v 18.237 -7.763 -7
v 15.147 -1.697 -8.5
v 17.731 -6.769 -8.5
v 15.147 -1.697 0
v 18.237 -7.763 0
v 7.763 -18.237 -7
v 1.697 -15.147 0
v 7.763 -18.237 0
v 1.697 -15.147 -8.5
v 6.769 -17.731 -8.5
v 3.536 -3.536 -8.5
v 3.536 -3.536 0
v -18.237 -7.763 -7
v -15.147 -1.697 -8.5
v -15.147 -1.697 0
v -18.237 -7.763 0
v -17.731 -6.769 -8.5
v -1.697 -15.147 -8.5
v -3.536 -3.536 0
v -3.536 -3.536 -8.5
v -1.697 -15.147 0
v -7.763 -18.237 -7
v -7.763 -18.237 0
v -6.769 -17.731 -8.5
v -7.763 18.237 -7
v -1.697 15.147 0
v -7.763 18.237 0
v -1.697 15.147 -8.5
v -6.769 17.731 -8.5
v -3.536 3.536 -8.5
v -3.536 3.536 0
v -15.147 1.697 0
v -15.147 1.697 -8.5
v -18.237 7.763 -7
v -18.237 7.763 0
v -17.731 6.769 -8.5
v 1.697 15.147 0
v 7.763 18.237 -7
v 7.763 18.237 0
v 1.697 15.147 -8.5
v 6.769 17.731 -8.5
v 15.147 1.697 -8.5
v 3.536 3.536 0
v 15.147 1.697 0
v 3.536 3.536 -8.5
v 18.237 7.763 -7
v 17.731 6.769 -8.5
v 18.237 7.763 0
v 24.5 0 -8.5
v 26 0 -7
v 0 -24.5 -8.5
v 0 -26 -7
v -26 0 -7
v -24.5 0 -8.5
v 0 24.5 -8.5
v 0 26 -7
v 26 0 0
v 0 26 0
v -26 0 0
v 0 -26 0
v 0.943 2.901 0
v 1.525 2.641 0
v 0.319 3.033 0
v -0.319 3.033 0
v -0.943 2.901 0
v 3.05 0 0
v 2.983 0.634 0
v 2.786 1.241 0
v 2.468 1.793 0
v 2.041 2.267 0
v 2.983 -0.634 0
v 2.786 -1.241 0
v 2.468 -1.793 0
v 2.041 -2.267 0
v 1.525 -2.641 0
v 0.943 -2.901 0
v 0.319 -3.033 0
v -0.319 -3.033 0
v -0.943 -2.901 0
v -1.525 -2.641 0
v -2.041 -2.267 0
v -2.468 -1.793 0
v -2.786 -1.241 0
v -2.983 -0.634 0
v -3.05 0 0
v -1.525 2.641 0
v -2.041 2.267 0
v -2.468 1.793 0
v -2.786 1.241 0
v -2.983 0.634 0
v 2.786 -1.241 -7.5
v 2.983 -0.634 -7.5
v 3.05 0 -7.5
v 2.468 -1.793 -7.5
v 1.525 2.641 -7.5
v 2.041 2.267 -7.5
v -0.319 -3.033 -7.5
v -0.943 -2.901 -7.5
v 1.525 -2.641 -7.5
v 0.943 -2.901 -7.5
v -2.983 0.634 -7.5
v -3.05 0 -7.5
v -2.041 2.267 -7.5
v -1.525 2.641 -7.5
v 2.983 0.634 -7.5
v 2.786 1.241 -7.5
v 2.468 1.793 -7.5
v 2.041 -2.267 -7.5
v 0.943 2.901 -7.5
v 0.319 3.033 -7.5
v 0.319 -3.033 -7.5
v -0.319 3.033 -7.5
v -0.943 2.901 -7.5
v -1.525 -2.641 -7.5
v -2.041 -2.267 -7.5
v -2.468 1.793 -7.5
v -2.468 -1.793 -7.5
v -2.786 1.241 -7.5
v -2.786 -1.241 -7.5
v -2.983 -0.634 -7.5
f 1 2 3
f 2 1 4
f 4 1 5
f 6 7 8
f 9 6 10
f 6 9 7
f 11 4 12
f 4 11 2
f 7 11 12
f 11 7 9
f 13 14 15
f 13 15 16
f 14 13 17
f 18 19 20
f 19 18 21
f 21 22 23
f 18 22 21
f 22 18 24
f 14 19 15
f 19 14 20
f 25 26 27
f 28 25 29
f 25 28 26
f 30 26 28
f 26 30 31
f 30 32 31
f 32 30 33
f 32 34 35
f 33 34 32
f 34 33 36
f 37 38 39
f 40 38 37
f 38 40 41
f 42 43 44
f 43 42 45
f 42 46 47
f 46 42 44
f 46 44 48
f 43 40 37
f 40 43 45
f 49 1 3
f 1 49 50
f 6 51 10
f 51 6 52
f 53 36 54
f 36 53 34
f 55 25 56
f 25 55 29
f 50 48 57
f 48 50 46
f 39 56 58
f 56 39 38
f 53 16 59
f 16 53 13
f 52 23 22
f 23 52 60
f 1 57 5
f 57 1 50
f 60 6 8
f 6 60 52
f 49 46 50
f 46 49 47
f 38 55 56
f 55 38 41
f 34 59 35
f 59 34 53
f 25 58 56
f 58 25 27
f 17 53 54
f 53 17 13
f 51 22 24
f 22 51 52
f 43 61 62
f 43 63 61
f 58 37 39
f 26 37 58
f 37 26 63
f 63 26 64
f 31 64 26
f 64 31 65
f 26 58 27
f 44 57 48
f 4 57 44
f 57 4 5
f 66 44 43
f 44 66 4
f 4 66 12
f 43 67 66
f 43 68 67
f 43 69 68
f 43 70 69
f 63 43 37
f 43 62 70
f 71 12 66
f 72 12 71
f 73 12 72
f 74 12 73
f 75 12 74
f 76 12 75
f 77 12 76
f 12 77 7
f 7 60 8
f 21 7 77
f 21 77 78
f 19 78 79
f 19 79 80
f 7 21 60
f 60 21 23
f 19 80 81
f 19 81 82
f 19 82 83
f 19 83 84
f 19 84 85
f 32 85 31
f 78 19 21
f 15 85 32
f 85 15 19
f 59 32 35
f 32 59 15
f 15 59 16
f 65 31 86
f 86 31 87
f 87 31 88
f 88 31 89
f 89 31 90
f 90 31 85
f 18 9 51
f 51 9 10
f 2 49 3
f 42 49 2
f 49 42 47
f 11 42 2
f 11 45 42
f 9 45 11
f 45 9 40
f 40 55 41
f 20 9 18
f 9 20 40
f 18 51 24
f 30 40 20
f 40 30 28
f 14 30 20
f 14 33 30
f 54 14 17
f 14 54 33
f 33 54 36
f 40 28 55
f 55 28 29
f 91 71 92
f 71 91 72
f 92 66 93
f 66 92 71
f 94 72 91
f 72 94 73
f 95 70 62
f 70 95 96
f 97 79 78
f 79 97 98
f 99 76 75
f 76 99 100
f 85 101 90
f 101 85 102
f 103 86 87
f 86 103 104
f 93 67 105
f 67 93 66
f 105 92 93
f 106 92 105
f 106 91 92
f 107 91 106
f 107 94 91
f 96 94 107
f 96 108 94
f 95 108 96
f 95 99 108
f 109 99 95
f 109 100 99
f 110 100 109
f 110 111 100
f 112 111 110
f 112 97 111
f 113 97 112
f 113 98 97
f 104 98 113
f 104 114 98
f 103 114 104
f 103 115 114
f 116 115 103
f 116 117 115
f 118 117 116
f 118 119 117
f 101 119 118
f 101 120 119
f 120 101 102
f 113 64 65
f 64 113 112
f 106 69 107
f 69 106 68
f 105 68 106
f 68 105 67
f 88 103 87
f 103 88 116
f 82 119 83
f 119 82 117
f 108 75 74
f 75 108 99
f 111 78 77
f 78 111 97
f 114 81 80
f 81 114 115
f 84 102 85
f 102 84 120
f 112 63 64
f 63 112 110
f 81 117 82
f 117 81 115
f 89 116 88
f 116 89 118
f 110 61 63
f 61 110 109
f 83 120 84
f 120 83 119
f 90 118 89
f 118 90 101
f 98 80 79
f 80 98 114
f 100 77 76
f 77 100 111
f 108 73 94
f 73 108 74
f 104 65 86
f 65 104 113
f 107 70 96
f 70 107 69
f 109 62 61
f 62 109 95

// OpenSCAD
/* Knob
Jack Ha 2016
*/

// C = Cylinder, F = Flower
SHAPE = "C";  

// ** Cylinder options OUTER RADIUS
CYLINDER_R_OUTER = 26;
// 'amount of taper'
ROUNDING_R = 1.5;
C_FN = 4;

C_CUT_NUM = 4;  // often the same as C_FN
C_CUT_R = 10; //radius
C_CUT_OFFSET = 15;  
C_CUT_FN = 5; // vertices
C_CUT_SCALE = 1;  // normally 1, scale the cylinder being cut from base, try it out :-)
C_CUT_ANGLE = 36;
// precalculation, do not change
C_ANGLE = 360 / C_CUT_NUM;
C_ANGLE_OFFSET = 0.5 * C_ANGLE;  // 0 or 0.5*C_ANGLE 

// ** Flower options
F_NUM_LEAFS = 3;  // 5, 7, 3
F_LEAF_OFFSET = 22.5;  // 20, 20, 20
F_LEAF_R_INNER = 5;  // 2.5, 2, 5
F_LEAF_R_OUTER = 1.5;  // 6, 5, 2
// precalculation, do not change
F_ANGLE = 360 / F_NUM_LEAFS;


// AXLE options

// HEIGHT=13 for 20mm pots/rotary encoders, 10 for 15mm; or through hole, then choose something you like^^
H = 8.5;

// D for D shape or N for normal
AXLE_TYPE = "N";  

// depth of hole, optionally leave 1 mm on top (H-1) or through hole (H+1)
AXLE_D = H - 1;  
// for D axle hole, there is an extra round part
AXLE_D2 = 2.5;  
// for 6mm axle
AXLE_R = 3.05;

// for 6mm D shaped axle
AXLE_D_R = 3.2;

module pin_d(r, d) {
	translate([0,0,-0.1])
	difference() {
		cylinder(r=r, h=0.1+d, $fn=30);
		translate([1.6,-50,-1])
		cube([100,100,100]);
	}
}

module pin(r, d) {
	translate([0,0,-0.1])
    cylinder(r=r, h=0.1+d, $fn=30);
}


M = [ [ 1, 0, 0, 0 ],
       [ 0, 1, 0.3, 0 ],  // The "0.7" is the skew value; pushed along the y axis
       [ 0, 0, 1, 0 ],
       [ 0, 0, 0, 1 ] ] ;

module base_cylinder() {
    difference() {
	minkowski() {
        //multmatrix(M) {
        //    union() {
		//sphere(r=ROUNDING_R, $fn=12);
		cylinder(r1=ROUNDING_R, r2=0, h=ROUNDING_R, $fn=C_FN);
		cylinder(r=CYLINDER_R_OUTER-ROUNDING_R, h=H-ROUNDING_R, $fn=C_FN);
        //    }
        //}
	}
    for (i=[0:C_CUT_NUM-1]) {
            rotate([0,0,C_ANGLE_OFFSET+C_ANGLE*i])
            translate([C_CUT_OFFSET,0,-0.1])
            rotate([0,0,C_CUT_ANGLE])            
            scale([C_CUT_SCALE,1,1])
        
            //multmatrix(M) {
            //union() {
                cylinder(r=C_CUT_R, h=H+0.2, $fn=C_CUT_FN); }
            //}
        //}
    }
}

module flower() {
    for (i=[0:F_NUM_LEAFS-1]) {
        rotate([0,0,F_ANGLE*i])
        hull() {
            cylinder(r=F_LEAF_R_INNER, h=H);

            translate([F_LEAF_OFFSET,0,0])
            cylinder(r=F_LEAF_R_OUTER, h=H);
        }
    }
}


rotate([180,0,0])
difference() {
    if (SHAPE == "C") {
        base_cylinder();
    } else if (SHAPE == "F") {
        flower();
    }
    if (AXLE_TYPE == "D") {
        pin_d(AXLE_D_R, AXLE_D);
        pin(AXLE_D_R+0.2, AXLE_D2);
    } else {
        pin(AXLE_R, AXLE_D);
    }
}
